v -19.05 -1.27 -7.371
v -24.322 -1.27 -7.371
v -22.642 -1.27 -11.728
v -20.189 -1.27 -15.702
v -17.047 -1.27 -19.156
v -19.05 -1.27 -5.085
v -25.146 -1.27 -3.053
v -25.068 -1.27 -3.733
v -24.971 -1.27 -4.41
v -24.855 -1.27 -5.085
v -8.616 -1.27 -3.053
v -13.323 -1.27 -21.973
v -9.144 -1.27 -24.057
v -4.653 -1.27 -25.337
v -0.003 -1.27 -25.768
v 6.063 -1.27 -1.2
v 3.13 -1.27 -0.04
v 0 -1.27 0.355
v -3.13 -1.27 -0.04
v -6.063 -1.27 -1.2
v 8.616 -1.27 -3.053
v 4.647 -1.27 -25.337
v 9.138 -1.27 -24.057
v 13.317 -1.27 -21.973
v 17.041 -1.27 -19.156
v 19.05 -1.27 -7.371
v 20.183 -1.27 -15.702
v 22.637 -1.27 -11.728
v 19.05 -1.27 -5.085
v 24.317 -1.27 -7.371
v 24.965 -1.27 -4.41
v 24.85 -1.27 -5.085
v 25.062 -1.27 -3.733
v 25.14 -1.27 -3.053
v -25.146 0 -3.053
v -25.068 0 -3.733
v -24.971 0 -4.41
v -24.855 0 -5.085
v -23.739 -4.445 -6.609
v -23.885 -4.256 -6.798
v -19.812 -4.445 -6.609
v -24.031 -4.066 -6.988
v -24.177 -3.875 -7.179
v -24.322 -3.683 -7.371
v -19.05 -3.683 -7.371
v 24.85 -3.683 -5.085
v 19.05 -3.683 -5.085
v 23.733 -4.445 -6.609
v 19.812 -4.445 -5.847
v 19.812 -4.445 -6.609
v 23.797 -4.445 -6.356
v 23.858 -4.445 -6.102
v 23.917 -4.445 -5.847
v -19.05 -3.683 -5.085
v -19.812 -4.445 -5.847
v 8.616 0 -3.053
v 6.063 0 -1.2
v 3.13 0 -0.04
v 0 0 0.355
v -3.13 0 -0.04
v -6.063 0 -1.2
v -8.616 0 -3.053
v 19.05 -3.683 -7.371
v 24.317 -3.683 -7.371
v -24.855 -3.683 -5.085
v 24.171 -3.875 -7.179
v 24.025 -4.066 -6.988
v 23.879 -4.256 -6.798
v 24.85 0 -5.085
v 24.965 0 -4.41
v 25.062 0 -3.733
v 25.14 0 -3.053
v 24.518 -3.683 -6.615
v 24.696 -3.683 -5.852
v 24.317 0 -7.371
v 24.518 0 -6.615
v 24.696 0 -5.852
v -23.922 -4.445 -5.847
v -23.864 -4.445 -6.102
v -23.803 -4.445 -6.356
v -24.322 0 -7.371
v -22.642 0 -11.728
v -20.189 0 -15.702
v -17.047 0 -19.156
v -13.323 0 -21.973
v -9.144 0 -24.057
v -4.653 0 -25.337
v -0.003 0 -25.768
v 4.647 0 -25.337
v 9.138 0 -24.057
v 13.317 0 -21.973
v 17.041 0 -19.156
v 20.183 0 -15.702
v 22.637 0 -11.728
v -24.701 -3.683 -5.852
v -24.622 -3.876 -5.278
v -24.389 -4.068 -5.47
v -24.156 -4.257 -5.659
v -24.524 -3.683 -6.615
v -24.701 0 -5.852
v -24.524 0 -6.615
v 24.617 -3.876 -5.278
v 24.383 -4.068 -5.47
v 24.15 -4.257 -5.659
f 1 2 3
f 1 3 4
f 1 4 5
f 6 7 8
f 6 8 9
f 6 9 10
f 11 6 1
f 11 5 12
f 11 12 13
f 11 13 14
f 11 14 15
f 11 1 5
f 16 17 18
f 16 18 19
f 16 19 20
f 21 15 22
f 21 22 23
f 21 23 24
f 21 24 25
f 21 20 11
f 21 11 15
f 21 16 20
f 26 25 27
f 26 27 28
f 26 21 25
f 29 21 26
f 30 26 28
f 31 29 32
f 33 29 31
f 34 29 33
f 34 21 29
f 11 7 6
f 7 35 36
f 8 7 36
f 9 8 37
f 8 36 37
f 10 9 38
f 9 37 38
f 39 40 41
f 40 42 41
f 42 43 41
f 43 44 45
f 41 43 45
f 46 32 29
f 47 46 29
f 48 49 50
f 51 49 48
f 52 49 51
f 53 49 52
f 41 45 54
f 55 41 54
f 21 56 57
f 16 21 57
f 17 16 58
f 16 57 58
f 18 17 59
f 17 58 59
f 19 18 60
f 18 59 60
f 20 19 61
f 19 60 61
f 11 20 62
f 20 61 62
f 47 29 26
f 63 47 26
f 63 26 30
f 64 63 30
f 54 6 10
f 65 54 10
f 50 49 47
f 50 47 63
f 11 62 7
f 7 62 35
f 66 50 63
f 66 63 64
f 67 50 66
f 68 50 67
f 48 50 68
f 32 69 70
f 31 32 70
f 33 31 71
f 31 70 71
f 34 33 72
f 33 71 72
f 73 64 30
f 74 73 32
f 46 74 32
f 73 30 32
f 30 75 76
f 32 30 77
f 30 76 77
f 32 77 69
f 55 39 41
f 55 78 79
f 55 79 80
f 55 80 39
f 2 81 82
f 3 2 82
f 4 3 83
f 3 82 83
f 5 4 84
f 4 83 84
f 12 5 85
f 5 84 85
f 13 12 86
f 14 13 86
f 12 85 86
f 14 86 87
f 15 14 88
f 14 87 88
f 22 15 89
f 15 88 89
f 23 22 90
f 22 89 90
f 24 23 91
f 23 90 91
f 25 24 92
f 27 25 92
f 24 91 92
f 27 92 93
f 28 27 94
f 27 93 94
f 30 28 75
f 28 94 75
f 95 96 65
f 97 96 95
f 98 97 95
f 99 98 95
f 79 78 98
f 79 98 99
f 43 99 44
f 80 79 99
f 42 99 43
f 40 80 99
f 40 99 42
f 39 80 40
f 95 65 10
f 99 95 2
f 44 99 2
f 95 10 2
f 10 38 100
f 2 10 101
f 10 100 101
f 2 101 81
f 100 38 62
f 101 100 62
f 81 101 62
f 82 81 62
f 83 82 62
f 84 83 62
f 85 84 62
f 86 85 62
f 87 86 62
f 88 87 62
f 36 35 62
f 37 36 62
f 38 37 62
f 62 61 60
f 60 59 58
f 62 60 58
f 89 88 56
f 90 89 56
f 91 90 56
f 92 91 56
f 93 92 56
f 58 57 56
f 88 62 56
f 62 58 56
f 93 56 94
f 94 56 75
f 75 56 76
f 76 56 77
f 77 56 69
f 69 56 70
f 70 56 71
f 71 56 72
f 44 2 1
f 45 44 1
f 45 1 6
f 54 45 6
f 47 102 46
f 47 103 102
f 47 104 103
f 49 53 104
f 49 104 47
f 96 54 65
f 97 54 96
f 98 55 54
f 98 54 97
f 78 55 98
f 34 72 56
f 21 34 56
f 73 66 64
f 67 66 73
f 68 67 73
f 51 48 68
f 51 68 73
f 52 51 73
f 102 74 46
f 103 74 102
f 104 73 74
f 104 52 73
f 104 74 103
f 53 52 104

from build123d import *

# Parameters (mm, degrees)
F1_DEPTH = 1.27
F2_DEPTH = 4.445
F3_SIZE2 = 0.762
F3_SIZE  = 0.762


# Not quite as in the source:
# - a feature names something its author has since deleted; it is built from what else it names


with BuildPart() as f1:
    # F0 (on Front) → F1 (new body)
    with BuildSketch(Plane.XZ):
        with BuildLine():
            Line((-8.6160342025, -3.05308), (-25.146, -3.05308))
            ThreePointArc((-25.146, -3.05308), (-25.0213724382, -4.0720308287), (-24.855468258, -5.08508))
            Line((-24.855468258, -5.08508), (-19.05, -5.08508))
            Line((-19.05, -5.08508), (-19.05, -7.37108))
            Line((-19.05, -7.37108), (-24.3224034139, -7.37108))
            ThreePointArc((-24.3224034139, -7.37108), (-0.002803144, -25.7679203368), (24.3167971258, -7.37108))
            Line((24.3167971258, -7.37108), (19.05, -7.37108))
            Line((19.05, -7.37108), (19.05, -5.08508))
            Line((19.05, -5.08508), (24.8498619699, -5.08508))
            ThreePointArc((24.8498619699, -5.08508), (25.0157661502, -4.0720308287), (25.1403937119, -3.05308))
            Line((25.1403937119, -3.05308), (8.6160342025, -3.05308))
            ThreePointArc((8.6160342025, -3.05308), (11.5583898274, -7.2348059893), (12.5961765249, -12.2415302321))
            ThreePointArc((12.5961765249, -12.2415302321), (-5.0067242428, -23.7999200595), (-8.6160342025, -3.05308))
        make_face()
        with BuildLine():
            Line((8.6160342025, -3.05308), (-8.6160342025, -3.05308))
            ThreePointArc((-8.6160342025, -3.05308), (-5.0067242428, -23.7999200595), (12.5961765249, -12.2415302321))
            ThreePointArc((12.5961765249, -12.2415302321), (11.5583898274, -7.2348059893), (8.6160342025, -3.05308))
        make_face()
        with BuildLine():
            ThreePointArc((8.6160342025, -3.05308), (0, 0.3546462928), (-8.6160342025, -3.05308))
            Line((-8.6160342025, -3.05308), (8.6160342025, -3.05308))
        make_face()
    extrude(amount=F1_DEPTH)

    # F0 (on Front) → F2 (join)
    with BuildSketch(Plane.XZ):
        with BuildLine():
            Line((-19.05, -5.08508), (-24.855468258, -5.08508))
            ThreePointArc((-24.855468258, -5.08508), (-24.6154903144, -6.2342721517), (-24.3224034139, -7.37108))
            Line((-24.3224034139, -7.37108), (-19.05, -7.37108))
            Line((-19.05, -7.37108), (-19.05, -5.08508))
        make_face()
        with BuildLine():
            Line((19.05, -7.37108), (24.3167971258, -7.37108))
            ThreePointArc((24.3167971258, -7.37108), (24.6098840263, -6.2342721517), (24.8498619699, -5.08508))
            Line((24.8498619699, -5.08508), (19.05, -5.08508))
            Line((19.05, -5.08508), (19.05, -7.37108))
        make_face()
    extrude(amount=F2_DEPTH)

    # F3
    f3_edges = [f1.edges().sort_by_distance(p)[0] for p in [
        (21.949931, -4.445, -5.08508),
        (19.05, -4.445, -6.22808),
        (21.683399, -4.445, -7.37108),
        (24.609884, -4.445, -6.234272),
        (-21.686202, -4.445, -7.37108),
        (-24.61549, -4.445, -6.234272),
        (-19.05, -4.445, -6.22808),
        (-21.952734, -4.445, -5.08508),
    ]]
    chamfer(f3_edges, length=F3_SIZE, length2=F3_SIZE2)


solid = f1.part
